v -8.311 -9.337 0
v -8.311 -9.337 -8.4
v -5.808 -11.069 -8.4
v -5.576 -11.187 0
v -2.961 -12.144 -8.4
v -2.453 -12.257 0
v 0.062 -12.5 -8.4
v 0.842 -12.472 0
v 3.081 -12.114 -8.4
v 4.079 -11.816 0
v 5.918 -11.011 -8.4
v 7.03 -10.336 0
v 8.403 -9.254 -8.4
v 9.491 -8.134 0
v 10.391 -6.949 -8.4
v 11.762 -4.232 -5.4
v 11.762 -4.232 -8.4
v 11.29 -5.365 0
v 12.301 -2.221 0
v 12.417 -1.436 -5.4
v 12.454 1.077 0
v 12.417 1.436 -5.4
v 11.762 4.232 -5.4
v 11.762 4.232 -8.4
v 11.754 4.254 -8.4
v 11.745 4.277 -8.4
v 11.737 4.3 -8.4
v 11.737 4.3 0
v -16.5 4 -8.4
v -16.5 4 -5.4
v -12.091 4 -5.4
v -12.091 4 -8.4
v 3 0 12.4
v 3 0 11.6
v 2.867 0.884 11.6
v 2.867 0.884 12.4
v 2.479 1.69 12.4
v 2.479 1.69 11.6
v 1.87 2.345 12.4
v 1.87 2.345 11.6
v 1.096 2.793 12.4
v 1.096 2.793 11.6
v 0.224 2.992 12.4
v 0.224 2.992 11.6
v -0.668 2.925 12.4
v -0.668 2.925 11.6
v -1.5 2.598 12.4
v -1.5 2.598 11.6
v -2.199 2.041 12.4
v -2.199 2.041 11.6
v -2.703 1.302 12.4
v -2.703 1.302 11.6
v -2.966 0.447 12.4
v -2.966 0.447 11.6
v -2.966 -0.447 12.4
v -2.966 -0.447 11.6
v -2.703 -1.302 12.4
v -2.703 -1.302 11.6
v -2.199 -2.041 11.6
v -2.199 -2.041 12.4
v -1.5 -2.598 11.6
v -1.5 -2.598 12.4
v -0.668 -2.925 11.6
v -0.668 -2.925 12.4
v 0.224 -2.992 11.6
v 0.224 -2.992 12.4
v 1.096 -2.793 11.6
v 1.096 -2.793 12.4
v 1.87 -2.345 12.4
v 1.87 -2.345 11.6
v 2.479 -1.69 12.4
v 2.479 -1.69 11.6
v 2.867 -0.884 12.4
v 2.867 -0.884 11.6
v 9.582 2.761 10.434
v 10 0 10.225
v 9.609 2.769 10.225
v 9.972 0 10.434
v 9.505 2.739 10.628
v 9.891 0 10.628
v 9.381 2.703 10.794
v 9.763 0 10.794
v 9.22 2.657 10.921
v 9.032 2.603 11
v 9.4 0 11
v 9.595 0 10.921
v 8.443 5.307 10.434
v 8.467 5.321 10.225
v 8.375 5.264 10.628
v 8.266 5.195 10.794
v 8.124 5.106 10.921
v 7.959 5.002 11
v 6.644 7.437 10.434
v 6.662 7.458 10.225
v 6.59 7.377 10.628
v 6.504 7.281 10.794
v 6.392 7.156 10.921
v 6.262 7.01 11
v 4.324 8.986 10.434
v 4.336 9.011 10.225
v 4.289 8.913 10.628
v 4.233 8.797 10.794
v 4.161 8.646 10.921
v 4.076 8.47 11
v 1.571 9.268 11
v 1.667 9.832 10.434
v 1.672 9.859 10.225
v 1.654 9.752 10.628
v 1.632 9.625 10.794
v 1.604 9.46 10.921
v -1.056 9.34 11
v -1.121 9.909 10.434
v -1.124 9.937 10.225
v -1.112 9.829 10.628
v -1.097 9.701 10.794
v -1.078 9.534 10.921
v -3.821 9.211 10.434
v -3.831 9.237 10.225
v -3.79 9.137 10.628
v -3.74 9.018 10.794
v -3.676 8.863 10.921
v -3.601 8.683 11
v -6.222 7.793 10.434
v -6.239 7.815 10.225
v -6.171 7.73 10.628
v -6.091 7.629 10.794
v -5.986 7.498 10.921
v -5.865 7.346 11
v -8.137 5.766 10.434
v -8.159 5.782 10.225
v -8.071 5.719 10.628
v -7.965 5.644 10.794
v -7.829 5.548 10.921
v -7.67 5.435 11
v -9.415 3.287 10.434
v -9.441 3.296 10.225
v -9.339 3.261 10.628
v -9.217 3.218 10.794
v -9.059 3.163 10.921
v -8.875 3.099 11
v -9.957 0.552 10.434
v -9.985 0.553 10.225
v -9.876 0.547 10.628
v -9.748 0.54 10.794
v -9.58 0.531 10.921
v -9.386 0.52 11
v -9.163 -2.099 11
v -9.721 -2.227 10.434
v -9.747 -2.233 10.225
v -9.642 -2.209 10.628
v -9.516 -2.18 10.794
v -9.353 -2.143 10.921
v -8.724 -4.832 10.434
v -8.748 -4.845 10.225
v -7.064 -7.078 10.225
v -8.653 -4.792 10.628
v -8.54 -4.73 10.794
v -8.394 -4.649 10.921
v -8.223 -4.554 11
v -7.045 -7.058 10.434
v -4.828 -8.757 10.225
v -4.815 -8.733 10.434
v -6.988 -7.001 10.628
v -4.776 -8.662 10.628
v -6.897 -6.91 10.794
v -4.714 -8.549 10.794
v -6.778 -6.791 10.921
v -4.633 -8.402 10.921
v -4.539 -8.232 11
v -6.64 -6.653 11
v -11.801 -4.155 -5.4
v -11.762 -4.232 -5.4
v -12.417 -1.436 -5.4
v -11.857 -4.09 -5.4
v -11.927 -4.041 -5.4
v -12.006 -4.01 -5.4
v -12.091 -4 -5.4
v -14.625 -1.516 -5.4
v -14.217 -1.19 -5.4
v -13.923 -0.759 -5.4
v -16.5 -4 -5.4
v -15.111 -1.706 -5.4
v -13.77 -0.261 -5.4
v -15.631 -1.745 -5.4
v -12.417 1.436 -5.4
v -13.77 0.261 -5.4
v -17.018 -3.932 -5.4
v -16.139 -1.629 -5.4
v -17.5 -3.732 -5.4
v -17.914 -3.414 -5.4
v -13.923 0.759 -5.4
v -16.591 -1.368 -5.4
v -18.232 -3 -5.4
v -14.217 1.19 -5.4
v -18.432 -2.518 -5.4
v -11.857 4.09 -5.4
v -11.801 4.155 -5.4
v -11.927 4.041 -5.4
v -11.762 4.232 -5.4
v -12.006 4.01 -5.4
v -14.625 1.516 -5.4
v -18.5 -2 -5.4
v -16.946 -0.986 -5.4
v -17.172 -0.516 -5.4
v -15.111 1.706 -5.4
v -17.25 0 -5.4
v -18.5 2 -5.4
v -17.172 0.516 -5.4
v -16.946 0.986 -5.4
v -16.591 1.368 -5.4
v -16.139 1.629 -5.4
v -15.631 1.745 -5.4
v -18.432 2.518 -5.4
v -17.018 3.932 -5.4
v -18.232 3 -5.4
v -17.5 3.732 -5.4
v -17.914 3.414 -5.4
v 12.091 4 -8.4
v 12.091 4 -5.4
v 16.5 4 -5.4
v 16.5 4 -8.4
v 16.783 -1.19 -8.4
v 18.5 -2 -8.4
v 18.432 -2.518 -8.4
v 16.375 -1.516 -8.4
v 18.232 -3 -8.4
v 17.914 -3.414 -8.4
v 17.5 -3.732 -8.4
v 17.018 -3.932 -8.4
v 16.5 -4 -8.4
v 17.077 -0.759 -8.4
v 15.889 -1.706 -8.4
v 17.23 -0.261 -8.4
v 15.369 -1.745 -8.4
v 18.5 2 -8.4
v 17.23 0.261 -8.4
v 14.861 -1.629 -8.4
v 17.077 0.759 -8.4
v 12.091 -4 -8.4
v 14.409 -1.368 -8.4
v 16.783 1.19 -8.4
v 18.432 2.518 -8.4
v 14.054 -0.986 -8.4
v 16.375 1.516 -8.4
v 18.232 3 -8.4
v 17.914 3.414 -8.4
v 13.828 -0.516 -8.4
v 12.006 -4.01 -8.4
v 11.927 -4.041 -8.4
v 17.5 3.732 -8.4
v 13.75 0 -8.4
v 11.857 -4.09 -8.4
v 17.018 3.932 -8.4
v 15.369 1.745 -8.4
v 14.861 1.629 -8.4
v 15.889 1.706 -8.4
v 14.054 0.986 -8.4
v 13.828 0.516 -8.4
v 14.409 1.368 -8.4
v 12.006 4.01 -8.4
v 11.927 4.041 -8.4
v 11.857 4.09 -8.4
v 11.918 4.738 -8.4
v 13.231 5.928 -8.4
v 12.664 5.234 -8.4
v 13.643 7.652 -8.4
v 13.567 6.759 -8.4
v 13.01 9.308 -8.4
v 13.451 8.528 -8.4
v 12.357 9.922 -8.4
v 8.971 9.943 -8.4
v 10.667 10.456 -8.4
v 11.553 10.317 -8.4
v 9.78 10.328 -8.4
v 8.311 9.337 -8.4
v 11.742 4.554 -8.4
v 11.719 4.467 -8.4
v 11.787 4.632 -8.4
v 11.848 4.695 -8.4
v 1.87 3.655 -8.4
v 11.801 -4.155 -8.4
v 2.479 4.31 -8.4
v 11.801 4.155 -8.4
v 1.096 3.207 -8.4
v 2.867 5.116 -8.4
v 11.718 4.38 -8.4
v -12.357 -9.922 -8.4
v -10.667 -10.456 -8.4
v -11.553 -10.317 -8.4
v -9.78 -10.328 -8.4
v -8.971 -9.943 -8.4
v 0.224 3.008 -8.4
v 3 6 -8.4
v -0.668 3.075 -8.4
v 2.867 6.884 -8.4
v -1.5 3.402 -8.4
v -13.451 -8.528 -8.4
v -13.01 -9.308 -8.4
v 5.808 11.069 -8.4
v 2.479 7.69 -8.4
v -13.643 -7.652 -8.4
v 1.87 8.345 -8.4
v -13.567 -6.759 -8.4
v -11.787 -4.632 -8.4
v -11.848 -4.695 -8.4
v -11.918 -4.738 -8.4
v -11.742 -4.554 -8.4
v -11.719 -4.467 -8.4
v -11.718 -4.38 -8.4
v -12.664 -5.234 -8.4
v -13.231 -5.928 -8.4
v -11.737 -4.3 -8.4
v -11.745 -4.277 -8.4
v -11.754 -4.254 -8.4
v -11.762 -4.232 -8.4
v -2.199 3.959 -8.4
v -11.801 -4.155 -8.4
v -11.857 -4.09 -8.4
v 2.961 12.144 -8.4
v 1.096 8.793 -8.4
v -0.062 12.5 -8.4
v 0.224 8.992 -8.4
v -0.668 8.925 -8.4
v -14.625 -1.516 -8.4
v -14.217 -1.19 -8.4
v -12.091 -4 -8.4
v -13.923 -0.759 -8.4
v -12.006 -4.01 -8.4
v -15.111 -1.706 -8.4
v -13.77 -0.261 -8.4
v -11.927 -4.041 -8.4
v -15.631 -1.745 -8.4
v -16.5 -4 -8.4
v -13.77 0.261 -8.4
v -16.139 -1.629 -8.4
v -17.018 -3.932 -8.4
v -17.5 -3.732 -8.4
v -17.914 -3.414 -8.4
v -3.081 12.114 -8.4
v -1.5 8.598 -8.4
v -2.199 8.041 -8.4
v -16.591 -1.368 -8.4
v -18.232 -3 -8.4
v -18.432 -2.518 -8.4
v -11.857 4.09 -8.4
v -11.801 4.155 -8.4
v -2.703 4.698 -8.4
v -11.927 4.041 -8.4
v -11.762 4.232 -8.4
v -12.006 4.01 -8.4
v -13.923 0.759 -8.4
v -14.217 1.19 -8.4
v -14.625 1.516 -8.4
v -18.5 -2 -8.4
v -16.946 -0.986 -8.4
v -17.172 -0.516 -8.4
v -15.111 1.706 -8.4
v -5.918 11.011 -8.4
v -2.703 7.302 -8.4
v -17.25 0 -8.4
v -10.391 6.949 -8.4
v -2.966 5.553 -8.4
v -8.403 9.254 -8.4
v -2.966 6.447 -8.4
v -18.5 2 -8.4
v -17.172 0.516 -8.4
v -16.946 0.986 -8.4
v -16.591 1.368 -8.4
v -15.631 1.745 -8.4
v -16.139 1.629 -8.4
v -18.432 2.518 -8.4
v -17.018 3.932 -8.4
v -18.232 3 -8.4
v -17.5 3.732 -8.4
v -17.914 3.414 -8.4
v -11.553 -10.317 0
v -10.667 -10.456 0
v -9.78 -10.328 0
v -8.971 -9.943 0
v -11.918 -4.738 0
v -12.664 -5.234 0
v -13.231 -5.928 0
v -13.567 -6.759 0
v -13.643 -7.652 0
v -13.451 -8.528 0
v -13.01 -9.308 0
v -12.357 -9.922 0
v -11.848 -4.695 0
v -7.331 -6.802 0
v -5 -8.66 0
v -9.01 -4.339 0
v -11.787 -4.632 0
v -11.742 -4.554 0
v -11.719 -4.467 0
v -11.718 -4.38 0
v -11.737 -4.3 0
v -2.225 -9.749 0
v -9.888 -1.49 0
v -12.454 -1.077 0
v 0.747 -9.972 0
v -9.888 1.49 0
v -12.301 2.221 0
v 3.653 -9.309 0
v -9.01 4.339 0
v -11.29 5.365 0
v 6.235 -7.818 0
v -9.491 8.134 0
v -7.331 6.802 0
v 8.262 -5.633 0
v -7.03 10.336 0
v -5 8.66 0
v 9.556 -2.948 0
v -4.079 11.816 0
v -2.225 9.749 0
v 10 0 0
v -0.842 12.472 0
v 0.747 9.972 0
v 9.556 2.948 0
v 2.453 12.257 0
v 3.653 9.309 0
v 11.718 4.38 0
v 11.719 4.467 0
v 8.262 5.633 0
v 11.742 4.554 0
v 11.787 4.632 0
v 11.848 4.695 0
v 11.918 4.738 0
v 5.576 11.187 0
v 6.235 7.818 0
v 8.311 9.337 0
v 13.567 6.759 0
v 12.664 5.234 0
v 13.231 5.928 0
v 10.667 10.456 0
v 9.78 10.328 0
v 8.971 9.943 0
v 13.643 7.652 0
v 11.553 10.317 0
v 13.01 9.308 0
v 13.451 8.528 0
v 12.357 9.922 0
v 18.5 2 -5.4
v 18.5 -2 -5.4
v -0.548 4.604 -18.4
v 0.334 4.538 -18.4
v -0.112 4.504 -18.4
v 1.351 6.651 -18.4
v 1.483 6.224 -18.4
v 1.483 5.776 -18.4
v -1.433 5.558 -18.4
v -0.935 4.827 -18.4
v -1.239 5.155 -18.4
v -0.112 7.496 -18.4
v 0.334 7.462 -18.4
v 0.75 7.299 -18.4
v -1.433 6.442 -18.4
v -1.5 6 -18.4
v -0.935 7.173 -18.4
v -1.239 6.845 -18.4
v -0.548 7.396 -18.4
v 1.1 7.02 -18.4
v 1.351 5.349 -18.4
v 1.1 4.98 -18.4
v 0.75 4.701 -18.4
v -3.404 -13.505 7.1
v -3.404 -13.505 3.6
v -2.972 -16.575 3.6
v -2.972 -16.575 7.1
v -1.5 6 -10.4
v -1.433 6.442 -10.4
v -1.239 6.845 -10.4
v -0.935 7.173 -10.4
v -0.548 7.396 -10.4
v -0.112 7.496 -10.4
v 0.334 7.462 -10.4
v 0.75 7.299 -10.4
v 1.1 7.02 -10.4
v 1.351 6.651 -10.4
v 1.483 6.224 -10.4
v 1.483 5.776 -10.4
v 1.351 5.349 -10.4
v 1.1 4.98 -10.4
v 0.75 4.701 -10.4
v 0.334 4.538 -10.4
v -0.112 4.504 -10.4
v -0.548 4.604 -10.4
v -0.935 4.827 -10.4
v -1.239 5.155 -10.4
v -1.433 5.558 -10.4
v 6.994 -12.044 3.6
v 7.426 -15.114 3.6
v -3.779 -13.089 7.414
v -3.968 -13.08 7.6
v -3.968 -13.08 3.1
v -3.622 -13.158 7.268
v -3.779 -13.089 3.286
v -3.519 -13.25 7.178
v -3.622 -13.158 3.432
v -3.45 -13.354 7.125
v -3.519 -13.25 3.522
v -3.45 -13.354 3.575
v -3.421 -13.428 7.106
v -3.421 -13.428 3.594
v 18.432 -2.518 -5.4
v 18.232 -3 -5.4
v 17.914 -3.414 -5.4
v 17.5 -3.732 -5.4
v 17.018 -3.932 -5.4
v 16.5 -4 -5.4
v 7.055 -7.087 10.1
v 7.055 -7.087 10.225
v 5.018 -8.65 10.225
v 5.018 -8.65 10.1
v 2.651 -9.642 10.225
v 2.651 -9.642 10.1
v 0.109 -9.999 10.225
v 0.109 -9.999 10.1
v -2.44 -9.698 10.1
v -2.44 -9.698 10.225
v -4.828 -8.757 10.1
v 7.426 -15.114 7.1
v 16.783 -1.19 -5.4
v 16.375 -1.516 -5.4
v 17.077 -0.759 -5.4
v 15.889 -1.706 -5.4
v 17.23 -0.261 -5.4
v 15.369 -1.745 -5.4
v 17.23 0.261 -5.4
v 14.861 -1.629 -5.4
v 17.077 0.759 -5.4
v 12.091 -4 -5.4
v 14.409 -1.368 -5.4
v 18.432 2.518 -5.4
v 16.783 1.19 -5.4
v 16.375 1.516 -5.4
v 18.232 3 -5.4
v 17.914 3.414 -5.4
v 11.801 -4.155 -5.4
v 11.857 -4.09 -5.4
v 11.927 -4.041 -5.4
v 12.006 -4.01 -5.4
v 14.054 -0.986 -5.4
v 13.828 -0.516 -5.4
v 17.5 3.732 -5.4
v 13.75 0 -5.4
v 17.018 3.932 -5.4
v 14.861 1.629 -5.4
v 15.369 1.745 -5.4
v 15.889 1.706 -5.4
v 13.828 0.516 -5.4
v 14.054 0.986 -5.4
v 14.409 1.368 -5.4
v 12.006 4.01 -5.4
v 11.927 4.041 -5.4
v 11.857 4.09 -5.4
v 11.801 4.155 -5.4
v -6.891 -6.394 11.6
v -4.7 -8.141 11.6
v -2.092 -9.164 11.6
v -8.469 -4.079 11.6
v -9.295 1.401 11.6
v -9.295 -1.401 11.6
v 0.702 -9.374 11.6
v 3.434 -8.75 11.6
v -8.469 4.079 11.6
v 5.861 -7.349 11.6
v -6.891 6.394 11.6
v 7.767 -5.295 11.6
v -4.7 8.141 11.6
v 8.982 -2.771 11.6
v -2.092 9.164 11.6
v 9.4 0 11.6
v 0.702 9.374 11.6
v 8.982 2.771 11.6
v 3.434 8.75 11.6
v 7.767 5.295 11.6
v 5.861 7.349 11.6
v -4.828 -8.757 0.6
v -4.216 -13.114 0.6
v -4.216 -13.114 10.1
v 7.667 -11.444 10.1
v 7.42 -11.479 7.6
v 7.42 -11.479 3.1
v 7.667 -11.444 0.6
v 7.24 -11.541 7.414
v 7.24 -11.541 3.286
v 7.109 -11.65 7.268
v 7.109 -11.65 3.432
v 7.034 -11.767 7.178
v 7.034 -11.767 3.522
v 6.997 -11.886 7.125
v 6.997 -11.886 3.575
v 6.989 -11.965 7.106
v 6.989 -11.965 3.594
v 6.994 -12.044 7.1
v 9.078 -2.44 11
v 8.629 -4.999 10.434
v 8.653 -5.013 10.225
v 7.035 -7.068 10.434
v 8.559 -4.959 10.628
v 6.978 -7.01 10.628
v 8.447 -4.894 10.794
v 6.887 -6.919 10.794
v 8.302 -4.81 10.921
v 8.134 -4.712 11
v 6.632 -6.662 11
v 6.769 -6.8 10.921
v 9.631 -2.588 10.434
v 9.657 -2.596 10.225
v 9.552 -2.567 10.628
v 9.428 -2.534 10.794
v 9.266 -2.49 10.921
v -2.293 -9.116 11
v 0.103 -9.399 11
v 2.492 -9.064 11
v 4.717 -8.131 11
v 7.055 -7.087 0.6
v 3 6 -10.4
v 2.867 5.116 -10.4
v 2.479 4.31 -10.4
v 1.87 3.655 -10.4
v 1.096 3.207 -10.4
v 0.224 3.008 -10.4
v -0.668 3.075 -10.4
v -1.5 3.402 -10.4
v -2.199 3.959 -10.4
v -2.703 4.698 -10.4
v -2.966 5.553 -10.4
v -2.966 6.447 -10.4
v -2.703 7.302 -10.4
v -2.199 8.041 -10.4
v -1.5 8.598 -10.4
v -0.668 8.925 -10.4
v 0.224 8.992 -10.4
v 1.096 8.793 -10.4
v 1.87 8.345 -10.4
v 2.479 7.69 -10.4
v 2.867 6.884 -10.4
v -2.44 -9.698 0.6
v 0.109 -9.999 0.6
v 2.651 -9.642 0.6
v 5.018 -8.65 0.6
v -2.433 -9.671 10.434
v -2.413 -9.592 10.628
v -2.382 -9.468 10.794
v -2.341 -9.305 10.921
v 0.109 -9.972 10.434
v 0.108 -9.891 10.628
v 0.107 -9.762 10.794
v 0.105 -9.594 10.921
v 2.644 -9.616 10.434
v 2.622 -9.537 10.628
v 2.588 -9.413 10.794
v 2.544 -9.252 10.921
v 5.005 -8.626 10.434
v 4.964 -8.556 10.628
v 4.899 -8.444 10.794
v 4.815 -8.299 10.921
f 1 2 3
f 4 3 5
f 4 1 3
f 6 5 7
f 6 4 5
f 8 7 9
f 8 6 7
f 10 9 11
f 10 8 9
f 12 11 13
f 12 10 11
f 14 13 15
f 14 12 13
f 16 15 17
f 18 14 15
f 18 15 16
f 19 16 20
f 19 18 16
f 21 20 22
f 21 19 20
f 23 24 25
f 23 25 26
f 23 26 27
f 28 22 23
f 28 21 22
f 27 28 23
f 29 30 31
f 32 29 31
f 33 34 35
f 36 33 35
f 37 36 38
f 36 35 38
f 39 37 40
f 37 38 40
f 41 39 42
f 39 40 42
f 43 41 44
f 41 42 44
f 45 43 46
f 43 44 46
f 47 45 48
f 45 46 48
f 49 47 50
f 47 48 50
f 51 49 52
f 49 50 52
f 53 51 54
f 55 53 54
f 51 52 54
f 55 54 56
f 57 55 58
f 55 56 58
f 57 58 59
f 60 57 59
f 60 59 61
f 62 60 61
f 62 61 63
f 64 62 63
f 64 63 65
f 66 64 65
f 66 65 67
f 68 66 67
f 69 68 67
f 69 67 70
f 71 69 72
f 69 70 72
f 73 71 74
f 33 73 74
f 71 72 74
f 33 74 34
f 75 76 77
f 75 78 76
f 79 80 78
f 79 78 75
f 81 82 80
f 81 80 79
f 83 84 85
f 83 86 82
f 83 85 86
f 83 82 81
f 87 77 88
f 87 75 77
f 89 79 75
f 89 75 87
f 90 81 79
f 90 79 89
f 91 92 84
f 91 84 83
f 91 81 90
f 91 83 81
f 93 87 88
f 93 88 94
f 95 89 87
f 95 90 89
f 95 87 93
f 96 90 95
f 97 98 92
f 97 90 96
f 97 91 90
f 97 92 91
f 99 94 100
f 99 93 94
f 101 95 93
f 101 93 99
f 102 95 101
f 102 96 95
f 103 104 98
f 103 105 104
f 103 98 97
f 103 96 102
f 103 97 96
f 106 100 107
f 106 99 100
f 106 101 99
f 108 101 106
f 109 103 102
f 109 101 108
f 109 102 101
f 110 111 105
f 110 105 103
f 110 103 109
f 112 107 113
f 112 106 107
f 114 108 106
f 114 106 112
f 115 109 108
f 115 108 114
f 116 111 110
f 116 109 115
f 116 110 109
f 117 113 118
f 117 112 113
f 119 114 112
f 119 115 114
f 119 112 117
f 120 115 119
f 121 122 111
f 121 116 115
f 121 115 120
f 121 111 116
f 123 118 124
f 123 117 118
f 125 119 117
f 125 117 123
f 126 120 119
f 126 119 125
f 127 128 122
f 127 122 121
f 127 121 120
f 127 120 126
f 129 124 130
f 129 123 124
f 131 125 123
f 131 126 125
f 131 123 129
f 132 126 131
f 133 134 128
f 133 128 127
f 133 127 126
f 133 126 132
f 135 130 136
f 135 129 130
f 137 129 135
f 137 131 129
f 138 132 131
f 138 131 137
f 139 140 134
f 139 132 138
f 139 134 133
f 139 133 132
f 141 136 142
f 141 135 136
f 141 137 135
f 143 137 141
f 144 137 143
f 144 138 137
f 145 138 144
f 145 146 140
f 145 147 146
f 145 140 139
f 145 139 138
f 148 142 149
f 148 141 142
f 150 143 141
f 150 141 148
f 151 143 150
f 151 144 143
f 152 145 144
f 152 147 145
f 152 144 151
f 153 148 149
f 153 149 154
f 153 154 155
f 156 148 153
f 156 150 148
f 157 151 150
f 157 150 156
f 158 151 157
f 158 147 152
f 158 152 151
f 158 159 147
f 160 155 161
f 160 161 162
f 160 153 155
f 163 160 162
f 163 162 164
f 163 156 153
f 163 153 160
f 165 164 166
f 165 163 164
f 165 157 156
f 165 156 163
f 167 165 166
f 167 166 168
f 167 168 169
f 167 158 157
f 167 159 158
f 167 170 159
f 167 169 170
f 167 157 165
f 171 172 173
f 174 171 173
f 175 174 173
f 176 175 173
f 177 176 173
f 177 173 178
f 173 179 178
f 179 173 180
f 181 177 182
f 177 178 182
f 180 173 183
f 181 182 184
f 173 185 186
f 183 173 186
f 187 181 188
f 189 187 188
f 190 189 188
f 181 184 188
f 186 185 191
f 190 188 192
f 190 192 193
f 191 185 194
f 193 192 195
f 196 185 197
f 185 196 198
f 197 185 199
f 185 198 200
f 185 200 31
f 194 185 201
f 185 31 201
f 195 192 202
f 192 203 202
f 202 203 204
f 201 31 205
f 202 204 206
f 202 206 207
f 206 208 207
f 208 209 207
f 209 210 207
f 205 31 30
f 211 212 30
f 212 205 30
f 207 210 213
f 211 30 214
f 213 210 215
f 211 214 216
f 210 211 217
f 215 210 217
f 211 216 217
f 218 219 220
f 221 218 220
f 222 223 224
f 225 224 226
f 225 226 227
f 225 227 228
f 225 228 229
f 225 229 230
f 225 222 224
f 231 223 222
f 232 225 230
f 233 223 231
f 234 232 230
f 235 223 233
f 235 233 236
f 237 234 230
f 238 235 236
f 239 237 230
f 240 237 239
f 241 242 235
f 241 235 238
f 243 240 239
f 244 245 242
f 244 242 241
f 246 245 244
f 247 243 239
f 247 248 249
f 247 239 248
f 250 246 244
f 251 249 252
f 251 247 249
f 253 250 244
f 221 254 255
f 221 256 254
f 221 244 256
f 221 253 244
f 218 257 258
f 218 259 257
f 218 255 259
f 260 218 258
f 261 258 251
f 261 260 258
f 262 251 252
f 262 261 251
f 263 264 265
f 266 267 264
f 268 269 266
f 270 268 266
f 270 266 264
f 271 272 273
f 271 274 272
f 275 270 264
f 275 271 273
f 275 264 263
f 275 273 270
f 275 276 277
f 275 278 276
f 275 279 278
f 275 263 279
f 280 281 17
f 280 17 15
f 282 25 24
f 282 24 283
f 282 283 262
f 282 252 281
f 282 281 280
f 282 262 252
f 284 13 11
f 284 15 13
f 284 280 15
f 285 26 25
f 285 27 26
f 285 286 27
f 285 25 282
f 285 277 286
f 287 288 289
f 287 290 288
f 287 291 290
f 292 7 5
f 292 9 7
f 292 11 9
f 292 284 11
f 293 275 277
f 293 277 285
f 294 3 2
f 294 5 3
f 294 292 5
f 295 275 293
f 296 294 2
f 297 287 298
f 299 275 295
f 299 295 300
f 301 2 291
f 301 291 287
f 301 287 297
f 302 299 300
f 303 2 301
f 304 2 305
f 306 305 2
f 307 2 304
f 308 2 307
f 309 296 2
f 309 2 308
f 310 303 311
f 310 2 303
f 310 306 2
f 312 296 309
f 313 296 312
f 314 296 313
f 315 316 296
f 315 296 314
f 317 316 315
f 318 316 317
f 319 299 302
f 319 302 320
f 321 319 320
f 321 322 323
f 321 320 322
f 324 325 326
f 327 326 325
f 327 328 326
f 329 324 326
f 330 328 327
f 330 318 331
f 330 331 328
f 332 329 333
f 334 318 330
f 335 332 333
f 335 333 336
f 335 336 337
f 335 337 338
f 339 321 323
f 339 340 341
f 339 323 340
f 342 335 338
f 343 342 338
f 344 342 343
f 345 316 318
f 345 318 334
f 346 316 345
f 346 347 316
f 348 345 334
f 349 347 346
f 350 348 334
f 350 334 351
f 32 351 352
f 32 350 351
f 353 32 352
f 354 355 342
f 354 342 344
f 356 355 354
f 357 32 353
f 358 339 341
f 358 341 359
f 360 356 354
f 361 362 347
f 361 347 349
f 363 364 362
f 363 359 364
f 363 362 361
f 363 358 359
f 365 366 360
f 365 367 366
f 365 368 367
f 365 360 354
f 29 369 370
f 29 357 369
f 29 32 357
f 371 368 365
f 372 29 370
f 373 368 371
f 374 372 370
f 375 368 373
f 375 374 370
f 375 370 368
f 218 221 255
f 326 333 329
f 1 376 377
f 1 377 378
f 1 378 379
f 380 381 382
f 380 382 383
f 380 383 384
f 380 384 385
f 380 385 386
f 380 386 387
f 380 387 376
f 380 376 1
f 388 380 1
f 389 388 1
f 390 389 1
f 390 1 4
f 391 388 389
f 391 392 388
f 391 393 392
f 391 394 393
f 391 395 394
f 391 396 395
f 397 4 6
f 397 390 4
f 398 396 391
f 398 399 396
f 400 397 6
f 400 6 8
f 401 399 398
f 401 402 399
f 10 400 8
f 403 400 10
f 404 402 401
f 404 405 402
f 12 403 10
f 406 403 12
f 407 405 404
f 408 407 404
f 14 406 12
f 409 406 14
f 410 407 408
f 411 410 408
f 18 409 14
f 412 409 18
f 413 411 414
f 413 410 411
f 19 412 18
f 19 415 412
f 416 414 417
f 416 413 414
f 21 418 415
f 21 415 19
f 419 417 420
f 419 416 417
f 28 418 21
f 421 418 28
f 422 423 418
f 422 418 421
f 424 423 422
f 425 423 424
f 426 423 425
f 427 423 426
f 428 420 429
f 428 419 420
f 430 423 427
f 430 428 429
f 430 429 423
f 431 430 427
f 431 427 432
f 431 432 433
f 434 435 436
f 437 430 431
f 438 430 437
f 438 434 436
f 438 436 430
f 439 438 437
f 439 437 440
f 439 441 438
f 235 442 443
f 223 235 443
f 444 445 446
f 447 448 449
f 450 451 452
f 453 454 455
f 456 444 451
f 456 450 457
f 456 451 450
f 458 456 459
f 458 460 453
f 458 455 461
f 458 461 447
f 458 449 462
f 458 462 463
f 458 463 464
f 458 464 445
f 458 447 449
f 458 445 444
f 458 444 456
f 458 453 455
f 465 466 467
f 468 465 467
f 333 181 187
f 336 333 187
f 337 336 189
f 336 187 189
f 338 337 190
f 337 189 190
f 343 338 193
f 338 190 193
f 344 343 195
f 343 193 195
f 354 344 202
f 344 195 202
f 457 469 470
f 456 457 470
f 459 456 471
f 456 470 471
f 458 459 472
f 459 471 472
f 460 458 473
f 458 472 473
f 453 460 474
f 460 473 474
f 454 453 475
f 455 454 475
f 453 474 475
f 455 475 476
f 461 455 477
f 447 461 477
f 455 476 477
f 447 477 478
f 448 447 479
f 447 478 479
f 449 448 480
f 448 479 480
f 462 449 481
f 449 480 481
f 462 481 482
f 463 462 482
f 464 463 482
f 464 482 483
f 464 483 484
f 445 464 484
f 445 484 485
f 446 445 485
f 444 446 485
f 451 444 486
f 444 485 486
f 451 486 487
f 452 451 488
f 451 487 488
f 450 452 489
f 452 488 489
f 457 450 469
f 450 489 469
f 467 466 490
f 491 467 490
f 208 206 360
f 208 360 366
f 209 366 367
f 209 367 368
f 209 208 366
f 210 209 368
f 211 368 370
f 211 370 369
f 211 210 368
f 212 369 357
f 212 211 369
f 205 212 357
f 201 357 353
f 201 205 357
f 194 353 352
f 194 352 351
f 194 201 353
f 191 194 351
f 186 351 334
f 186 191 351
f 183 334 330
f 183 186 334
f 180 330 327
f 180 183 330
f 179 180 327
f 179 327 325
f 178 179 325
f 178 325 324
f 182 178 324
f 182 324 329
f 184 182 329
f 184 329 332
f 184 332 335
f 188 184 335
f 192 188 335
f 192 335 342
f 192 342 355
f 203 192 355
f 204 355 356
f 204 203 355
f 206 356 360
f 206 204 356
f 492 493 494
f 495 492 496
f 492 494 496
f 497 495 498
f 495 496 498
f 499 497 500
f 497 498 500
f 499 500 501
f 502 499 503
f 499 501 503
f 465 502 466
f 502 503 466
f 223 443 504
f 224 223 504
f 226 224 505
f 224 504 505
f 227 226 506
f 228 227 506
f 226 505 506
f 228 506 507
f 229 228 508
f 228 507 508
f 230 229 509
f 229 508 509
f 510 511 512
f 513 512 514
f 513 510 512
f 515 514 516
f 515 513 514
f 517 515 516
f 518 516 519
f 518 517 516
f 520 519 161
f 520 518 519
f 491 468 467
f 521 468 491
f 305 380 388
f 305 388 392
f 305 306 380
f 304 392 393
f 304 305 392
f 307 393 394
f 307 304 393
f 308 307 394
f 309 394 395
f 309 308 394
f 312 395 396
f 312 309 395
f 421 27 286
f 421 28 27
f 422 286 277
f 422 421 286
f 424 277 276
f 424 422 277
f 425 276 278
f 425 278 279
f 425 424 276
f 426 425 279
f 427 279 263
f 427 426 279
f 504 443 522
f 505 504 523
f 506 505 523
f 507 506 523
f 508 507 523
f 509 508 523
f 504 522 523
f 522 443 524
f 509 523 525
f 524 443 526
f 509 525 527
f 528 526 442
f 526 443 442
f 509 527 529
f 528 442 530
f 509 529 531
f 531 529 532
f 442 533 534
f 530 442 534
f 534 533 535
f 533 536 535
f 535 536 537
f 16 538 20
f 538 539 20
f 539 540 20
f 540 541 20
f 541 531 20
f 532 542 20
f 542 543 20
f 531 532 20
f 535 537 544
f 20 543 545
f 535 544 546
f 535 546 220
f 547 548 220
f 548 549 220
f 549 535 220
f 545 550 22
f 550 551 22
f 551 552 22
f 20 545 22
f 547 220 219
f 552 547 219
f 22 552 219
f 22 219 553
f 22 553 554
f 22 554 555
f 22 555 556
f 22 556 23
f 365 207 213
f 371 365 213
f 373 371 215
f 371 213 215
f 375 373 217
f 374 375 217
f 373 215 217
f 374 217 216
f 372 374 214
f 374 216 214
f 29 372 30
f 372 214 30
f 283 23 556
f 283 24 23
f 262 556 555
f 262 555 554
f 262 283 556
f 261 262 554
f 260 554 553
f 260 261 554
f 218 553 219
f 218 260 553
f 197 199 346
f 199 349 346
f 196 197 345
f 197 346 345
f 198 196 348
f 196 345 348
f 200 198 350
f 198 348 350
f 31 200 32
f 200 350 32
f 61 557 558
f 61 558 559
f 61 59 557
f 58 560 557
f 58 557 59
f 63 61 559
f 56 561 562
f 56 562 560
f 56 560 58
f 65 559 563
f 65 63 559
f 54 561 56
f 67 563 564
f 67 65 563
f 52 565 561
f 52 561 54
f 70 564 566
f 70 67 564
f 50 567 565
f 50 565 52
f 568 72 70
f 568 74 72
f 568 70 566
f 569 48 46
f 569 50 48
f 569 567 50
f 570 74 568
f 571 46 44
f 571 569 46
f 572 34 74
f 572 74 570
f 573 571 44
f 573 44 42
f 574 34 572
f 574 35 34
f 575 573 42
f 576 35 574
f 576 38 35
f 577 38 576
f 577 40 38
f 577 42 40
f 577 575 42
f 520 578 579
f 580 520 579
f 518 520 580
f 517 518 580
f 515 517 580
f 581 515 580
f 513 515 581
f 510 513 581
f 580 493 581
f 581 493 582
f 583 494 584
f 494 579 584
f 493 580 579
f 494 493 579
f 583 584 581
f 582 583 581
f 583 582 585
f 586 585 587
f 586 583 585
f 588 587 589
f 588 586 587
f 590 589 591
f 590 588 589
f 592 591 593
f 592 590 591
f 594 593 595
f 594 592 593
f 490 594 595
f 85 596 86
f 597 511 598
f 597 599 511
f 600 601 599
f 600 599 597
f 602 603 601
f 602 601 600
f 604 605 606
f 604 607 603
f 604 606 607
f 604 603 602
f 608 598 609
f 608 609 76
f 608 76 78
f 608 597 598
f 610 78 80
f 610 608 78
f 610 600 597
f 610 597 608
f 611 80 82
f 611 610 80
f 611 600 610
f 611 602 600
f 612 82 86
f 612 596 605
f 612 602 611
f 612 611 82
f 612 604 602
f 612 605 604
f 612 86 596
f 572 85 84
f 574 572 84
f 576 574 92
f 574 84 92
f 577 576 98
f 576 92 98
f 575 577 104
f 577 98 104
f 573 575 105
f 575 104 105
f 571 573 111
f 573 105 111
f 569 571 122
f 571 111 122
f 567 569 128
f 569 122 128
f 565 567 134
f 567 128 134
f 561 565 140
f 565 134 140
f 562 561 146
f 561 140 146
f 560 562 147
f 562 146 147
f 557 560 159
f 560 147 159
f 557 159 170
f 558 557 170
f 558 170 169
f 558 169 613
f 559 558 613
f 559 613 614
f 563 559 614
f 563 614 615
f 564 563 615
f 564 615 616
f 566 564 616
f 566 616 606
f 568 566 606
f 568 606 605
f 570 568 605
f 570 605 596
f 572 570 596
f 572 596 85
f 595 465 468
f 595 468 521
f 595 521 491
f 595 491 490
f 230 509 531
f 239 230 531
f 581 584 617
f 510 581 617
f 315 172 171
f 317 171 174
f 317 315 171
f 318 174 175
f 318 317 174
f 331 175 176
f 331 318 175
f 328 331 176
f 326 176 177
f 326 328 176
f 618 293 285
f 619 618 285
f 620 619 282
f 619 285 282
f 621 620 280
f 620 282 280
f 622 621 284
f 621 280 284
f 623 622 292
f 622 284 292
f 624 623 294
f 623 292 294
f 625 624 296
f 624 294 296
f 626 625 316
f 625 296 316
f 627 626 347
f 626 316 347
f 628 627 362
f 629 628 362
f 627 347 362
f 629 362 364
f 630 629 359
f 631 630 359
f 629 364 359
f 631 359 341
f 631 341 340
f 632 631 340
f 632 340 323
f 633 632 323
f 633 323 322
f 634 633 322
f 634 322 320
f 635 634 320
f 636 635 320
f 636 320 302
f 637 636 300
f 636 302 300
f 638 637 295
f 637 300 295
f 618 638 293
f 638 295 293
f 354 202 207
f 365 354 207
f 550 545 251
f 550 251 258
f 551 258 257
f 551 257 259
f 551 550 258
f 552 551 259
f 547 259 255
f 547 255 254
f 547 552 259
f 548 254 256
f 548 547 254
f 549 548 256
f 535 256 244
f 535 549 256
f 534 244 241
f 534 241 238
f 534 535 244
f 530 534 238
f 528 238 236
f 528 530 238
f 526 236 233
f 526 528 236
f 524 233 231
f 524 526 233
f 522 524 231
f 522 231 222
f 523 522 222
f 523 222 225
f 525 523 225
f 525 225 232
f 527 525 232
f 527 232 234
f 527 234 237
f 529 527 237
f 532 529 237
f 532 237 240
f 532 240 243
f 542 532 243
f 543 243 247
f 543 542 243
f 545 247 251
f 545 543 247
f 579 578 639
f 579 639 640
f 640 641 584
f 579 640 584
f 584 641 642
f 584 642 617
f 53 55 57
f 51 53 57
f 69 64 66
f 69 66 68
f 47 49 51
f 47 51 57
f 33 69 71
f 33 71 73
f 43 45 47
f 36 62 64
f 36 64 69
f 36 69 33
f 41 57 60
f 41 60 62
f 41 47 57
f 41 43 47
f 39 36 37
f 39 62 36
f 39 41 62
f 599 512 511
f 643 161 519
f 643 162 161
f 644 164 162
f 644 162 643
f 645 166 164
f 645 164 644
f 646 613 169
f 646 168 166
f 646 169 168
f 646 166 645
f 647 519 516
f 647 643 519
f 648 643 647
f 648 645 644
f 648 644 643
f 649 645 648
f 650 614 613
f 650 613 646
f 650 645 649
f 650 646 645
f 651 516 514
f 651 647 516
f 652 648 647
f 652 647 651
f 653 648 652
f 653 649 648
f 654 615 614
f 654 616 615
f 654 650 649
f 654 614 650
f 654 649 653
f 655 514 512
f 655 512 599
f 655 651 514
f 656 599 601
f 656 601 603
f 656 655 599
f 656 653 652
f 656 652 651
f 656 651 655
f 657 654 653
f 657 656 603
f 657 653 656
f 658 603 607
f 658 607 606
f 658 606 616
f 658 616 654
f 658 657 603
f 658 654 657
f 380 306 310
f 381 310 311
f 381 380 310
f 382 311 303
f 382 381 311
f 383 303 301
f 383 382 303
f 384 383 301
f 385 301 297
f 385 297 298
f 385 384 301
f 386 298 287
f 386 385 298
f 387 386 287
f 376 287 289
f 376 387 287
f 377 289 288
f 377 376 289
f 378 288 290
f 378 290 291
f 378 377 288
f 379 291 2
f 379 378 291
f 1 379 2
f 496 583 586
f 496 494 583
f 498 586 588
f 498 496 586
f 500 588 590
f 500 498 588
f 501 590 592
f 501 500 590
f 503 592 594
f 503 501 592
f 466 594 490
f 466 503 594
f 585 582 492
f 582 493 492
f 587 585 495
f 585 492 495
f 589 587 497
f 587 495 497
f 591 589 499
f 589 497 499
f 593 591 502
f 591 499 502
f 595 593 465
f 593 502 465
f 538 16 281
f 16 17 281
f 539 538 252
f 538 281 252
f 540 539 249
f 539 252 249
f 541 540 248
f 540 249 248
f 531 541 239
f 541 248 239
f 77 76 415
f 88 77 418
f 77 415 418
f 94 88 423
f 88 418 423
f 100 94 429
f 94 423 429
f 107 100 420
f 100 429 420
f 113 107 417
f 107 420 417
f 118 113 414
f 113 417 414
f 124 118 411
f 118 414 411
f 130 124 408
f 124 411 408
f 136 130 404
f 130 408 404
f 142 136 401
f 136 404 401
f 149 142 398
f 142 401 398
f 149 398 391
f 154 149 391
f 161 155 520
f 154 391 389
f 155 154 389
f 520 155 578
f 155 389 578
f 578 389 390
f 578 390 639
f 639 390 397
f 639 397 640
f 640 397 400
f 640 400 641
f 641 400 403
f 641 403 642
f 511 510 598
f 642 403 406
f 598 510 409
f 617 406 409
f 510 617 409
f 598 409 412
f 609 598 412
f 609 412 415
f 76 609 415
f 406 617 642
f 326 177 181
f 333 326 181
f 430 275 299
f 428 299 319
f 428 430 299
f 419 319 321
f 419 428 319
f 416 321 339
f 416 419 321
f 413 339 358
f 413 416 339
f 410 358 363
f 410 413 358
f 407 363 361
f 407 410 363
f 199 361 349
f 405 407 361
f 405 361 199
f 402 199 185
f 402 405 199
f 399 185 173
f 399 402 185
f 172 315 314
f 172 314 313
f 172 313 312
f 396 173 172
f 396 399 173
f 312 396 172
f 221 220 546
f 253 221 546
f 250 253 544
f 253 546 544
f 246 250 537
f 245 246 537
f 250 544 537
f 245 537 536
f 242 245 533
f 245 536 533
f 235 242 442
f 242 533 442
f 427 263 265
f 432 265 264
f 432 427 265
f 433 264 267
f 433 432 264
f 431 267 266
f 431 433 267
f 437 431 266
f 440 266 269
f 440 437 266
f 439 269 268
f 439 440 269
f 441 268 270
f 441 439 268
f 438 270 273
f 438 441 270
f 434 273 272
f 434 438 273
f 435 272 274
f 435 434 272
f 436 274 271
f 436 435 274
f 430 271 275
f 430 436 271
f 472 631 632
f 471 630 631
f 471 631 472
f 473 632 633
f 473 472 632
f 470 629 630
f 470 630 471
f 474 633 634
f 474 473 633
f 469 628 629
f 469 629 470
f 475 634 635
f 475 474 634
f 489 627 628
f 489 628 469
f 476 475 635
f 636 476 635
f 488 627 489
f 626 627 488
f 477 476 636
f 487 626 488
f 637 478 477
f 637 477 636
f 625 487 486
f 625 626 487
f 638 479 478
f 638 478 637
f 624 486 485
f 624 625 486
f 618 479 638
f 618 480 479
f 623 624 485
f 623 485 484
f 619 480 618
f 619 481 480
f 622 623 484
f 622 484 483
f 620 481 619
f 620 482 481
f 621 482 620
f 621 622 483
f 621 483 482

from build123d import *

# Parameters (mm, degrees)
SKETCH_1_R          = 10
EXTRUDE_1_DEPTH     = 11.6
SKETCH_2_R          = 12.5
EXTRUDE_2_DEPTH     = 8.4
EXTRUDE_START       = -3
SKETCH_3_R          = 1.75
SKETCH_3_R_2        = 1.749999999999227
EXTRUDE_3_DEPTH     = 3
EXTRUDE_START_2     = 5.4
EXTRUDE_4_DEPTH     = 5.4
SKETCH_5_R          = 3.000000000000001
EXTRUDE_5_DEPTH     = 2
SKETCH_6_R          = 1.5000000000000002
EXTRUDE_6_DEPTH     = 8
SKETCH_7_R          = 3
EXTRUDE_7_DEPTH     = 0.8
EXTRUDE_START_3     = -11
EXTRUDE_8_DEPTH     = 11
EXTRUDE_9_DEPTH     = 8
CUT_EXTRUDE_1_DEPTH = 4.5
FILLET_1_R          = 0.5
FILLET_4_R          = 0.35
CUT_EXTRUDE_START   = -1.5
CUT_EXTRUDE_2_DEPTH = 1.5
CUT_EXTRUDE_START_2 = -0.6
SKETCH_12_R         = 10
SKETCH_12_R_2       = 9.4
CUT_EXTRUDE_3_DEPTH = 0.6
FILLET_5_R          = 0.8


with BuildPart() as part:
    # ｽｹｯﾁ1 → ﾎﾞｽ - 押し出し1 (new body)
    with BuildSketch(Plane.XY):
        Circle(SKETCH_1_R)
    extrude(amount=EXTRUDE_1_DEPTH)

    # ｽｹｯﾁ2 → ﾎﾞｽ - 押し出し2 (add)
    with BuildSketch(Plane.XY):
        Circle(SKETCH_2_R)
    extrude(amount=-EXTRUDE_2_DEPTH)

    # ｽｹｯﾁ3 → ﾎﾞｽ - 押し出し3 (add)
    # profile 1 of 4: a face of its own
    with BuildSketch(Plane(origin=(0, 0, -8.4), x_dir=(-1, 0, 0), z_dir=(0, 0, -1)).offset(EXTRUDE_START)):
        with BuildLine():
            Line((-18.500000000000004, 2.0000000000000004), (-18.500000000000004, -2.0000000000000004))
            ThreePointArc((-18.500000000000004, -2.0000000000000004), (-17.914213562373096, -3.4142135623730976), (-16.5, -4))
            Line((-16.5, -4), (-11.842719282327012, -4.000000000000001))
            ThreePointArc((-11.842719282327012, -4.000000000000001), (-12.500000000000002, 1.53e-15), (-11.842719282327012, 4.000000000000001))
            Line((-11.842719282327012, 4.000000000000001), (-16.5, 4))
            ThreePointArc((-16.5, 4), (-17.914213562373096, 3.4142135623730976), (-18.500000000000004, 2.0000000000000004))
        make_face()
        with Locations((-15.5, 0)):
            Circle(SKETCH_3_R, mode=Mode.SUBTRACT)
    # profile 2 of 4: a face of its own
    with BuildSketch(Plane(origin=(0, 0, -8.4), x_dir=(-1, 0, 0), z_dir=(0, 0, -1)).offset(EXTRUDE_START)):
        with BuildLine():
            Line((16.50000000000071, 3.999999999997067), (11.842719282327723, 3.999999999997894))
            ThreePointArc((11.842719282327723, 3.999999999997894), (12.500000000000002, -2.22183e-12), (11.842719282326302, -4.000000000002104))
            Line((11.842719282326302, -4.000000000002104), (16.49999999999929, -4.000000000002934))
            ThreePointArc((16.49999999999929, -4.000000000002934), (17.914213562372492, -3.414213562376281), (18.49999999999965, -2.000000000003289))
            Line((18.49999999999965, -2.000000000003289), (18.500000000000355, 1.999999999996712))
            ThreePointArc((18.500000000000355, 1.999999999996712), (17.9142135623737, 3.414213562369911), (16.50000000000071, 3.999999999997067))
        make_face()
        with Locations((15.5, -2.75525e-12)):
            Circle(SKETCH_3_R_2, mode=Mode.SUBTRACT)
    # profile 3 of 4: a face of its own
    with BuildSketch(Plane(origin=(0, 0, -8.4), x_dir=(-1, 0, 0), z_dir=(0, 0, -1)).offset(EXTRUDE_START)):
        with BuildLine():
            ThreePointArc((-8.311246450809406, 9.336657990625344), (-10.239400553612443, 7.1697054543880165), (-11.616202318913265, 4.616691855222107))
            ThreePointArc((-11.616202318913265, 4.616691855222107), (-13.106432708623924, 9.177222981616662), (-8.311246450809406, 9.336657990625344))
        make_face()
    # profile 4 of 4: a face of its own
    with BuildSketch(Plane(origin=(0, 0, -8.4), x_dir=(-1, 0, 0), z_dir=(0, 0, -1)).offset(EXTRUDE_START)):
        with BuildLine():
            ThreePointArc((8.311246450807749, -9.33665799062682), (10.239400553611166, -7.169705454389839), (11.616202318912443, -4.6166918552241745))
            ThreePointArc((11.616202318912443, -4.6166918552241745), (13.106432708622291, -9.177222981618991), (8.311246450807749, -9.33665799062682))
        make_face()
    extrude(amount=EXTRUDE_3_DEPTH)

    # ｽｹｯﾁ4 → ﾎﾞｽ - 押し出し4 (add)
    with BuildSketch(Plane.XY.offset(-5.400000000000001).offset(EXTRUDE_START_2)):
        with BuildLine():
            ThreePointArc((-11.616202318912443, -4.616691855224174), (-13.10643270862229, -9.17722298161899), (-8.311246450807749, -9.336657990626819))
            ThreePointArc((-8.311246450807749, -9.336657990626819), (-10.239400553611167, -7.169705454389835), (-11.616202318912443, -4.616691855224174))
        make_face()
        with BuildLine():
            ThreePointArc((11.616202318913265, 4.616691855222107), (13.106432708623922, 9.177222981616662), (8.311246450809406, 9.336657990625344))
            ThreePointArc((8.311246450809406, 9.336657990625344), (10.23940055361244, 7.169705454388018), (11.616202318913265, 4.616691855222107))
        make_face()
    extrude(amount=-EXTRUDE_4_DEPTH)

    # ｽｹｯﾁ5 → ﾎﾞｽ - 押し出し5 (add)
    with BuildSketch(Plane(origin=(0, 0, -8.4), x_dir=(-1, 0, 0), z_dir=(0, 0, -1))):
        with Locations(Location((1.1e-16, 6, 0), (0, 0, 180))):
            Circle(SKETCH_5_R)
    extrude(amount=EXTRUDE_5_DEPTH)

    # ｽｹｯﾁ6 → ﾎﾞｽ - 押し出し6 (add)
    with BuildSketch(Plane(origin=(0, 0, -10.400000000000002), x_dir=(-1, 0, 0), z_dir=(0, 0, -1))):
        with Locations((1.1e-16, 6)):
            Circle(SKETCH_6_R)
    extrude(amount=EXTRUDE_6_DEPTH)

    # ｽｹｯﾁ7 → ﾎﾞｽ - 押し出し7 (add)
    with BuildSketch(Plane.XY.offset(11.6)):
        Circle(SKETCH_7_R)
    extrude(amount=EXTRUDE_7_DEPTH)

    # ｽｹｯﾁ8 → ﾎﾞｽ - 押し出し8 (add)
    with BuildSketch(Plane.XY.offset(11.6).offset(EXTRUDE_START_3)):
        with BuildLine():
            Line((-4.215861960544603, -13.114362658155867), (7.667354864354238, -11.444285446635076))
            Line((7.667354864354238, -11.444285446635076), (7.054993220129948, -7.087105944172167))
            ThreePointArc((7.054993220129948, -7.087105944172167), (1.3917310096006568, -9.902680687415703), (-4.828223604768894, -8.757183155692958))
            Line((-4.828223604768894, -8.757183155692958), (-4.215861960544603, -13.114362658155867))
        make_face()
    extrude(amount=EXTRUDE_8_DEPTH)

    # ｽｹｯﾁ9 → ﾎﾞｽ - 押し出し9 (add)
    with BuildSketch(Plane.XY.offset(11.6)):
        Polygon((-3.4731609089884254, -13.009982832435817), (-2.9721377455321845, -16.57494787990548), (7.4256769762543025, -15.113630319824779), (6.924653812798063, -11.548665272355127), align=None)
    extrude(amount=-EXTRUDE_9_DEPTH)

    # ｽｹｯﾁ10 → ｶｯﾄ - 押し出し1 (cut)
    with BuildSketch(Plane.XY.offset(11.6)):
        Polygon((6.924653812798063, -11.548665272355127), (-3.4731609089884254, -13.009982832435817), (-2.9721377455321845, -16.57494787990548), (7.4256769762543025, -15.113630319824779), align=None)
    extrude(amount=-CUT_EXTRUDE_1_DEPTH, mode=Mode.SUBTRACT)

    # ﾌｨﾚｯﾄ1
    fillet_1_edges = [part.edges().sort_by_distance(p)[0] for p in [
        (1.7257464519048185, -12.279324052395472, 3.5999999999999996),
        (-3.4731609089884254, -13.009982832435817, 5.35),
        (6.924653812798063, -11.548665272355127, 5.35),
        (1.7257464519048185, -12.279324052395472, 7.1),
    ]]
    fillet(fillet_1_edges, radius=FILLET_1_R)

    # ﾌｨﾚｯﾄ4
    fillet_4_edges = [part.edges().sort_by_distance(p)[0] for p in [
        (11.616202318913265, 4.616691855222108, -4.200000000000001),
        (11.84271928232701, 4.000000000000002, -6.9),
        (11.84271928232701, -4.000000000000001, -6.9),
        (-11.616202318912443, -4.6166918552241745, -4.2),
        (-11.8427192823263, -4.000000000002105, -6.9),
        (-11.842719282327721, 3.999999999997894, -6.9),
    ]]
    fillet(fillet_4_edges, radius=FILLET_4_R)

    # ｽｹｯﾁ11 → ｶｯﾄ - 押し出し2 (cut)
    with BuildSketch(Plane.XY.offset(11.6).offset(CUT_EXTRUDE_START)):
        with BuildLine():
            Line((-4.828223604768897, -8.757183155692957), (-4.215861960544603, -13.114362658155867))
            Line((-4.215861960544603, -13.114362658155867), (7.667354864354238, -11.444285446635076))
            Line((7.667354864354238, -11.444285446635076), (7.054993220129944, -7.087105944172171))
            ThreePointArc((7.054993220129944, -7.087105944172171), (1.3917310096006545, -9.902680687415703), (-4.828223604768897, -8.757183155692957))
        make_face()
    extrude(amount=CUT_EXTRUDE_2_DEPTH, mode=Mode.SUBTRACT)

    # ｽｹｯﾁ12 → ｶｯﾄ - 押し出し3 (cut)
    with BuildSketch(Plane.XY.offset(11.6).offset(CUT_EXTRUDE_START_2)):
        Circle(SKETCH_12_R)
        Circle(SKETCH_12_R_2, mode=Mode.SUBTRACT)
    extrude(amount=CUT_EXTRUDE_3_DEPTH, mode=Mode.SUBTRACT)

    # ﾌｨﾚｯﾄ5
    # the kernel refuses this fillet: 0.8 mm, written as the material it takes off along each edge
    with BuildSketch(Plane(origin=(0, 0, 11), x_dir=(0.7054993220130121, -0.7087105944171995, 0), z_dir=(-0.7087105944171995, -0.7054993220130121, 0))) as fillet_5_piece_1:
        with BuildLine():
            CenterArc((9.200000000000001, -0.7745966692414843), FILLET_5_R, 0, 75.52248781407015)
            Line((9.4, 0), (9.404000000000002, 0.01549193338482979))
            ThreePointArc((9.404000000000002, 0.01549193338482979), (9.700000000000001, 0.01600000000000001), (10, 0.01600000000000001))
            Line((10, 0.01600000000000001), (10.016, 0))
            Line((10.016, 0), (10.016, -0.7745966692414843))
            Line((10.016, -0.7745966692414843), (10, -0.7745966692414843))
        make_face()
    revolve(axis=Axis((0, 0, 11), (0, 0, 1)), revolution_arc=45.130102354154545, mode=Mode.SUBTRACT)
    with BuildSketch(Plane(origin=(0, 0, 11), x_dir=(-0.48282236047689747, -0.8757183155692913, 0), z_dir=(-0.8757183155692913, 0.48282236047689747, 0))) as fillet_5_piece_2:
        with BuildLine():
            CenterArc((9.200000000000001, -0.7745966692414824), FILLET_5_R, 0, 75.52248781407025)
            Line((10.000000000000002, -0.7745966692414824), (10.016000000000002, -0.7745966692414824))
            Line((10.016000000000002, -0.7745966692414824), (10.016, 0))
            Line((10.016, 0), (10, 0.01600000000000001))
            ThreePointArc((10, 0.01600000000000001), (9.699999999999998, 0.01600000000000001), (9.404, 0.01549193338483157))
            Line((9.404, 0.01549193338483157), (9.399999999999999, 1.78e-15))
        make_face()
    revolve(axis=Axis((0, 0, 11), (0, 0, 1)), revolution_arc=73.73979529168996, mode=Mode.SUBTRACT)
    with BuildSketch(Plane(origin=(0, 0, 11), x_dir=(1, 0, 0), z_dir=(0, -1, 0))) as fillet_5_piece_3:
        with BuildLine():
            CenterArc((9.2, -0.7745966692414825), FILLET_5_R, 0, 75.52248781406999)
            Line((9.4, 0), (9.404, 0.01549193338482979))
            ThreePointArc((9.404, 0.01549193338482979), (9.7, 0.01600000000000001), (10, 0.01600000000000001))
            Line((10, 0.01600000000000001), (10.016, 0))
            Line((10.016, 0), (10.016, -0.7745966692414825))
            Line((10.016, -0.7745966692414825), (10, -0.7745966692414825))
        make_face()
    revolve(axis=Axis((0, 0, 11), (0, 0, 1)), revolution_arc=241.1301023541555, mode=Mode.SUBTRACT)


solid = part.part
